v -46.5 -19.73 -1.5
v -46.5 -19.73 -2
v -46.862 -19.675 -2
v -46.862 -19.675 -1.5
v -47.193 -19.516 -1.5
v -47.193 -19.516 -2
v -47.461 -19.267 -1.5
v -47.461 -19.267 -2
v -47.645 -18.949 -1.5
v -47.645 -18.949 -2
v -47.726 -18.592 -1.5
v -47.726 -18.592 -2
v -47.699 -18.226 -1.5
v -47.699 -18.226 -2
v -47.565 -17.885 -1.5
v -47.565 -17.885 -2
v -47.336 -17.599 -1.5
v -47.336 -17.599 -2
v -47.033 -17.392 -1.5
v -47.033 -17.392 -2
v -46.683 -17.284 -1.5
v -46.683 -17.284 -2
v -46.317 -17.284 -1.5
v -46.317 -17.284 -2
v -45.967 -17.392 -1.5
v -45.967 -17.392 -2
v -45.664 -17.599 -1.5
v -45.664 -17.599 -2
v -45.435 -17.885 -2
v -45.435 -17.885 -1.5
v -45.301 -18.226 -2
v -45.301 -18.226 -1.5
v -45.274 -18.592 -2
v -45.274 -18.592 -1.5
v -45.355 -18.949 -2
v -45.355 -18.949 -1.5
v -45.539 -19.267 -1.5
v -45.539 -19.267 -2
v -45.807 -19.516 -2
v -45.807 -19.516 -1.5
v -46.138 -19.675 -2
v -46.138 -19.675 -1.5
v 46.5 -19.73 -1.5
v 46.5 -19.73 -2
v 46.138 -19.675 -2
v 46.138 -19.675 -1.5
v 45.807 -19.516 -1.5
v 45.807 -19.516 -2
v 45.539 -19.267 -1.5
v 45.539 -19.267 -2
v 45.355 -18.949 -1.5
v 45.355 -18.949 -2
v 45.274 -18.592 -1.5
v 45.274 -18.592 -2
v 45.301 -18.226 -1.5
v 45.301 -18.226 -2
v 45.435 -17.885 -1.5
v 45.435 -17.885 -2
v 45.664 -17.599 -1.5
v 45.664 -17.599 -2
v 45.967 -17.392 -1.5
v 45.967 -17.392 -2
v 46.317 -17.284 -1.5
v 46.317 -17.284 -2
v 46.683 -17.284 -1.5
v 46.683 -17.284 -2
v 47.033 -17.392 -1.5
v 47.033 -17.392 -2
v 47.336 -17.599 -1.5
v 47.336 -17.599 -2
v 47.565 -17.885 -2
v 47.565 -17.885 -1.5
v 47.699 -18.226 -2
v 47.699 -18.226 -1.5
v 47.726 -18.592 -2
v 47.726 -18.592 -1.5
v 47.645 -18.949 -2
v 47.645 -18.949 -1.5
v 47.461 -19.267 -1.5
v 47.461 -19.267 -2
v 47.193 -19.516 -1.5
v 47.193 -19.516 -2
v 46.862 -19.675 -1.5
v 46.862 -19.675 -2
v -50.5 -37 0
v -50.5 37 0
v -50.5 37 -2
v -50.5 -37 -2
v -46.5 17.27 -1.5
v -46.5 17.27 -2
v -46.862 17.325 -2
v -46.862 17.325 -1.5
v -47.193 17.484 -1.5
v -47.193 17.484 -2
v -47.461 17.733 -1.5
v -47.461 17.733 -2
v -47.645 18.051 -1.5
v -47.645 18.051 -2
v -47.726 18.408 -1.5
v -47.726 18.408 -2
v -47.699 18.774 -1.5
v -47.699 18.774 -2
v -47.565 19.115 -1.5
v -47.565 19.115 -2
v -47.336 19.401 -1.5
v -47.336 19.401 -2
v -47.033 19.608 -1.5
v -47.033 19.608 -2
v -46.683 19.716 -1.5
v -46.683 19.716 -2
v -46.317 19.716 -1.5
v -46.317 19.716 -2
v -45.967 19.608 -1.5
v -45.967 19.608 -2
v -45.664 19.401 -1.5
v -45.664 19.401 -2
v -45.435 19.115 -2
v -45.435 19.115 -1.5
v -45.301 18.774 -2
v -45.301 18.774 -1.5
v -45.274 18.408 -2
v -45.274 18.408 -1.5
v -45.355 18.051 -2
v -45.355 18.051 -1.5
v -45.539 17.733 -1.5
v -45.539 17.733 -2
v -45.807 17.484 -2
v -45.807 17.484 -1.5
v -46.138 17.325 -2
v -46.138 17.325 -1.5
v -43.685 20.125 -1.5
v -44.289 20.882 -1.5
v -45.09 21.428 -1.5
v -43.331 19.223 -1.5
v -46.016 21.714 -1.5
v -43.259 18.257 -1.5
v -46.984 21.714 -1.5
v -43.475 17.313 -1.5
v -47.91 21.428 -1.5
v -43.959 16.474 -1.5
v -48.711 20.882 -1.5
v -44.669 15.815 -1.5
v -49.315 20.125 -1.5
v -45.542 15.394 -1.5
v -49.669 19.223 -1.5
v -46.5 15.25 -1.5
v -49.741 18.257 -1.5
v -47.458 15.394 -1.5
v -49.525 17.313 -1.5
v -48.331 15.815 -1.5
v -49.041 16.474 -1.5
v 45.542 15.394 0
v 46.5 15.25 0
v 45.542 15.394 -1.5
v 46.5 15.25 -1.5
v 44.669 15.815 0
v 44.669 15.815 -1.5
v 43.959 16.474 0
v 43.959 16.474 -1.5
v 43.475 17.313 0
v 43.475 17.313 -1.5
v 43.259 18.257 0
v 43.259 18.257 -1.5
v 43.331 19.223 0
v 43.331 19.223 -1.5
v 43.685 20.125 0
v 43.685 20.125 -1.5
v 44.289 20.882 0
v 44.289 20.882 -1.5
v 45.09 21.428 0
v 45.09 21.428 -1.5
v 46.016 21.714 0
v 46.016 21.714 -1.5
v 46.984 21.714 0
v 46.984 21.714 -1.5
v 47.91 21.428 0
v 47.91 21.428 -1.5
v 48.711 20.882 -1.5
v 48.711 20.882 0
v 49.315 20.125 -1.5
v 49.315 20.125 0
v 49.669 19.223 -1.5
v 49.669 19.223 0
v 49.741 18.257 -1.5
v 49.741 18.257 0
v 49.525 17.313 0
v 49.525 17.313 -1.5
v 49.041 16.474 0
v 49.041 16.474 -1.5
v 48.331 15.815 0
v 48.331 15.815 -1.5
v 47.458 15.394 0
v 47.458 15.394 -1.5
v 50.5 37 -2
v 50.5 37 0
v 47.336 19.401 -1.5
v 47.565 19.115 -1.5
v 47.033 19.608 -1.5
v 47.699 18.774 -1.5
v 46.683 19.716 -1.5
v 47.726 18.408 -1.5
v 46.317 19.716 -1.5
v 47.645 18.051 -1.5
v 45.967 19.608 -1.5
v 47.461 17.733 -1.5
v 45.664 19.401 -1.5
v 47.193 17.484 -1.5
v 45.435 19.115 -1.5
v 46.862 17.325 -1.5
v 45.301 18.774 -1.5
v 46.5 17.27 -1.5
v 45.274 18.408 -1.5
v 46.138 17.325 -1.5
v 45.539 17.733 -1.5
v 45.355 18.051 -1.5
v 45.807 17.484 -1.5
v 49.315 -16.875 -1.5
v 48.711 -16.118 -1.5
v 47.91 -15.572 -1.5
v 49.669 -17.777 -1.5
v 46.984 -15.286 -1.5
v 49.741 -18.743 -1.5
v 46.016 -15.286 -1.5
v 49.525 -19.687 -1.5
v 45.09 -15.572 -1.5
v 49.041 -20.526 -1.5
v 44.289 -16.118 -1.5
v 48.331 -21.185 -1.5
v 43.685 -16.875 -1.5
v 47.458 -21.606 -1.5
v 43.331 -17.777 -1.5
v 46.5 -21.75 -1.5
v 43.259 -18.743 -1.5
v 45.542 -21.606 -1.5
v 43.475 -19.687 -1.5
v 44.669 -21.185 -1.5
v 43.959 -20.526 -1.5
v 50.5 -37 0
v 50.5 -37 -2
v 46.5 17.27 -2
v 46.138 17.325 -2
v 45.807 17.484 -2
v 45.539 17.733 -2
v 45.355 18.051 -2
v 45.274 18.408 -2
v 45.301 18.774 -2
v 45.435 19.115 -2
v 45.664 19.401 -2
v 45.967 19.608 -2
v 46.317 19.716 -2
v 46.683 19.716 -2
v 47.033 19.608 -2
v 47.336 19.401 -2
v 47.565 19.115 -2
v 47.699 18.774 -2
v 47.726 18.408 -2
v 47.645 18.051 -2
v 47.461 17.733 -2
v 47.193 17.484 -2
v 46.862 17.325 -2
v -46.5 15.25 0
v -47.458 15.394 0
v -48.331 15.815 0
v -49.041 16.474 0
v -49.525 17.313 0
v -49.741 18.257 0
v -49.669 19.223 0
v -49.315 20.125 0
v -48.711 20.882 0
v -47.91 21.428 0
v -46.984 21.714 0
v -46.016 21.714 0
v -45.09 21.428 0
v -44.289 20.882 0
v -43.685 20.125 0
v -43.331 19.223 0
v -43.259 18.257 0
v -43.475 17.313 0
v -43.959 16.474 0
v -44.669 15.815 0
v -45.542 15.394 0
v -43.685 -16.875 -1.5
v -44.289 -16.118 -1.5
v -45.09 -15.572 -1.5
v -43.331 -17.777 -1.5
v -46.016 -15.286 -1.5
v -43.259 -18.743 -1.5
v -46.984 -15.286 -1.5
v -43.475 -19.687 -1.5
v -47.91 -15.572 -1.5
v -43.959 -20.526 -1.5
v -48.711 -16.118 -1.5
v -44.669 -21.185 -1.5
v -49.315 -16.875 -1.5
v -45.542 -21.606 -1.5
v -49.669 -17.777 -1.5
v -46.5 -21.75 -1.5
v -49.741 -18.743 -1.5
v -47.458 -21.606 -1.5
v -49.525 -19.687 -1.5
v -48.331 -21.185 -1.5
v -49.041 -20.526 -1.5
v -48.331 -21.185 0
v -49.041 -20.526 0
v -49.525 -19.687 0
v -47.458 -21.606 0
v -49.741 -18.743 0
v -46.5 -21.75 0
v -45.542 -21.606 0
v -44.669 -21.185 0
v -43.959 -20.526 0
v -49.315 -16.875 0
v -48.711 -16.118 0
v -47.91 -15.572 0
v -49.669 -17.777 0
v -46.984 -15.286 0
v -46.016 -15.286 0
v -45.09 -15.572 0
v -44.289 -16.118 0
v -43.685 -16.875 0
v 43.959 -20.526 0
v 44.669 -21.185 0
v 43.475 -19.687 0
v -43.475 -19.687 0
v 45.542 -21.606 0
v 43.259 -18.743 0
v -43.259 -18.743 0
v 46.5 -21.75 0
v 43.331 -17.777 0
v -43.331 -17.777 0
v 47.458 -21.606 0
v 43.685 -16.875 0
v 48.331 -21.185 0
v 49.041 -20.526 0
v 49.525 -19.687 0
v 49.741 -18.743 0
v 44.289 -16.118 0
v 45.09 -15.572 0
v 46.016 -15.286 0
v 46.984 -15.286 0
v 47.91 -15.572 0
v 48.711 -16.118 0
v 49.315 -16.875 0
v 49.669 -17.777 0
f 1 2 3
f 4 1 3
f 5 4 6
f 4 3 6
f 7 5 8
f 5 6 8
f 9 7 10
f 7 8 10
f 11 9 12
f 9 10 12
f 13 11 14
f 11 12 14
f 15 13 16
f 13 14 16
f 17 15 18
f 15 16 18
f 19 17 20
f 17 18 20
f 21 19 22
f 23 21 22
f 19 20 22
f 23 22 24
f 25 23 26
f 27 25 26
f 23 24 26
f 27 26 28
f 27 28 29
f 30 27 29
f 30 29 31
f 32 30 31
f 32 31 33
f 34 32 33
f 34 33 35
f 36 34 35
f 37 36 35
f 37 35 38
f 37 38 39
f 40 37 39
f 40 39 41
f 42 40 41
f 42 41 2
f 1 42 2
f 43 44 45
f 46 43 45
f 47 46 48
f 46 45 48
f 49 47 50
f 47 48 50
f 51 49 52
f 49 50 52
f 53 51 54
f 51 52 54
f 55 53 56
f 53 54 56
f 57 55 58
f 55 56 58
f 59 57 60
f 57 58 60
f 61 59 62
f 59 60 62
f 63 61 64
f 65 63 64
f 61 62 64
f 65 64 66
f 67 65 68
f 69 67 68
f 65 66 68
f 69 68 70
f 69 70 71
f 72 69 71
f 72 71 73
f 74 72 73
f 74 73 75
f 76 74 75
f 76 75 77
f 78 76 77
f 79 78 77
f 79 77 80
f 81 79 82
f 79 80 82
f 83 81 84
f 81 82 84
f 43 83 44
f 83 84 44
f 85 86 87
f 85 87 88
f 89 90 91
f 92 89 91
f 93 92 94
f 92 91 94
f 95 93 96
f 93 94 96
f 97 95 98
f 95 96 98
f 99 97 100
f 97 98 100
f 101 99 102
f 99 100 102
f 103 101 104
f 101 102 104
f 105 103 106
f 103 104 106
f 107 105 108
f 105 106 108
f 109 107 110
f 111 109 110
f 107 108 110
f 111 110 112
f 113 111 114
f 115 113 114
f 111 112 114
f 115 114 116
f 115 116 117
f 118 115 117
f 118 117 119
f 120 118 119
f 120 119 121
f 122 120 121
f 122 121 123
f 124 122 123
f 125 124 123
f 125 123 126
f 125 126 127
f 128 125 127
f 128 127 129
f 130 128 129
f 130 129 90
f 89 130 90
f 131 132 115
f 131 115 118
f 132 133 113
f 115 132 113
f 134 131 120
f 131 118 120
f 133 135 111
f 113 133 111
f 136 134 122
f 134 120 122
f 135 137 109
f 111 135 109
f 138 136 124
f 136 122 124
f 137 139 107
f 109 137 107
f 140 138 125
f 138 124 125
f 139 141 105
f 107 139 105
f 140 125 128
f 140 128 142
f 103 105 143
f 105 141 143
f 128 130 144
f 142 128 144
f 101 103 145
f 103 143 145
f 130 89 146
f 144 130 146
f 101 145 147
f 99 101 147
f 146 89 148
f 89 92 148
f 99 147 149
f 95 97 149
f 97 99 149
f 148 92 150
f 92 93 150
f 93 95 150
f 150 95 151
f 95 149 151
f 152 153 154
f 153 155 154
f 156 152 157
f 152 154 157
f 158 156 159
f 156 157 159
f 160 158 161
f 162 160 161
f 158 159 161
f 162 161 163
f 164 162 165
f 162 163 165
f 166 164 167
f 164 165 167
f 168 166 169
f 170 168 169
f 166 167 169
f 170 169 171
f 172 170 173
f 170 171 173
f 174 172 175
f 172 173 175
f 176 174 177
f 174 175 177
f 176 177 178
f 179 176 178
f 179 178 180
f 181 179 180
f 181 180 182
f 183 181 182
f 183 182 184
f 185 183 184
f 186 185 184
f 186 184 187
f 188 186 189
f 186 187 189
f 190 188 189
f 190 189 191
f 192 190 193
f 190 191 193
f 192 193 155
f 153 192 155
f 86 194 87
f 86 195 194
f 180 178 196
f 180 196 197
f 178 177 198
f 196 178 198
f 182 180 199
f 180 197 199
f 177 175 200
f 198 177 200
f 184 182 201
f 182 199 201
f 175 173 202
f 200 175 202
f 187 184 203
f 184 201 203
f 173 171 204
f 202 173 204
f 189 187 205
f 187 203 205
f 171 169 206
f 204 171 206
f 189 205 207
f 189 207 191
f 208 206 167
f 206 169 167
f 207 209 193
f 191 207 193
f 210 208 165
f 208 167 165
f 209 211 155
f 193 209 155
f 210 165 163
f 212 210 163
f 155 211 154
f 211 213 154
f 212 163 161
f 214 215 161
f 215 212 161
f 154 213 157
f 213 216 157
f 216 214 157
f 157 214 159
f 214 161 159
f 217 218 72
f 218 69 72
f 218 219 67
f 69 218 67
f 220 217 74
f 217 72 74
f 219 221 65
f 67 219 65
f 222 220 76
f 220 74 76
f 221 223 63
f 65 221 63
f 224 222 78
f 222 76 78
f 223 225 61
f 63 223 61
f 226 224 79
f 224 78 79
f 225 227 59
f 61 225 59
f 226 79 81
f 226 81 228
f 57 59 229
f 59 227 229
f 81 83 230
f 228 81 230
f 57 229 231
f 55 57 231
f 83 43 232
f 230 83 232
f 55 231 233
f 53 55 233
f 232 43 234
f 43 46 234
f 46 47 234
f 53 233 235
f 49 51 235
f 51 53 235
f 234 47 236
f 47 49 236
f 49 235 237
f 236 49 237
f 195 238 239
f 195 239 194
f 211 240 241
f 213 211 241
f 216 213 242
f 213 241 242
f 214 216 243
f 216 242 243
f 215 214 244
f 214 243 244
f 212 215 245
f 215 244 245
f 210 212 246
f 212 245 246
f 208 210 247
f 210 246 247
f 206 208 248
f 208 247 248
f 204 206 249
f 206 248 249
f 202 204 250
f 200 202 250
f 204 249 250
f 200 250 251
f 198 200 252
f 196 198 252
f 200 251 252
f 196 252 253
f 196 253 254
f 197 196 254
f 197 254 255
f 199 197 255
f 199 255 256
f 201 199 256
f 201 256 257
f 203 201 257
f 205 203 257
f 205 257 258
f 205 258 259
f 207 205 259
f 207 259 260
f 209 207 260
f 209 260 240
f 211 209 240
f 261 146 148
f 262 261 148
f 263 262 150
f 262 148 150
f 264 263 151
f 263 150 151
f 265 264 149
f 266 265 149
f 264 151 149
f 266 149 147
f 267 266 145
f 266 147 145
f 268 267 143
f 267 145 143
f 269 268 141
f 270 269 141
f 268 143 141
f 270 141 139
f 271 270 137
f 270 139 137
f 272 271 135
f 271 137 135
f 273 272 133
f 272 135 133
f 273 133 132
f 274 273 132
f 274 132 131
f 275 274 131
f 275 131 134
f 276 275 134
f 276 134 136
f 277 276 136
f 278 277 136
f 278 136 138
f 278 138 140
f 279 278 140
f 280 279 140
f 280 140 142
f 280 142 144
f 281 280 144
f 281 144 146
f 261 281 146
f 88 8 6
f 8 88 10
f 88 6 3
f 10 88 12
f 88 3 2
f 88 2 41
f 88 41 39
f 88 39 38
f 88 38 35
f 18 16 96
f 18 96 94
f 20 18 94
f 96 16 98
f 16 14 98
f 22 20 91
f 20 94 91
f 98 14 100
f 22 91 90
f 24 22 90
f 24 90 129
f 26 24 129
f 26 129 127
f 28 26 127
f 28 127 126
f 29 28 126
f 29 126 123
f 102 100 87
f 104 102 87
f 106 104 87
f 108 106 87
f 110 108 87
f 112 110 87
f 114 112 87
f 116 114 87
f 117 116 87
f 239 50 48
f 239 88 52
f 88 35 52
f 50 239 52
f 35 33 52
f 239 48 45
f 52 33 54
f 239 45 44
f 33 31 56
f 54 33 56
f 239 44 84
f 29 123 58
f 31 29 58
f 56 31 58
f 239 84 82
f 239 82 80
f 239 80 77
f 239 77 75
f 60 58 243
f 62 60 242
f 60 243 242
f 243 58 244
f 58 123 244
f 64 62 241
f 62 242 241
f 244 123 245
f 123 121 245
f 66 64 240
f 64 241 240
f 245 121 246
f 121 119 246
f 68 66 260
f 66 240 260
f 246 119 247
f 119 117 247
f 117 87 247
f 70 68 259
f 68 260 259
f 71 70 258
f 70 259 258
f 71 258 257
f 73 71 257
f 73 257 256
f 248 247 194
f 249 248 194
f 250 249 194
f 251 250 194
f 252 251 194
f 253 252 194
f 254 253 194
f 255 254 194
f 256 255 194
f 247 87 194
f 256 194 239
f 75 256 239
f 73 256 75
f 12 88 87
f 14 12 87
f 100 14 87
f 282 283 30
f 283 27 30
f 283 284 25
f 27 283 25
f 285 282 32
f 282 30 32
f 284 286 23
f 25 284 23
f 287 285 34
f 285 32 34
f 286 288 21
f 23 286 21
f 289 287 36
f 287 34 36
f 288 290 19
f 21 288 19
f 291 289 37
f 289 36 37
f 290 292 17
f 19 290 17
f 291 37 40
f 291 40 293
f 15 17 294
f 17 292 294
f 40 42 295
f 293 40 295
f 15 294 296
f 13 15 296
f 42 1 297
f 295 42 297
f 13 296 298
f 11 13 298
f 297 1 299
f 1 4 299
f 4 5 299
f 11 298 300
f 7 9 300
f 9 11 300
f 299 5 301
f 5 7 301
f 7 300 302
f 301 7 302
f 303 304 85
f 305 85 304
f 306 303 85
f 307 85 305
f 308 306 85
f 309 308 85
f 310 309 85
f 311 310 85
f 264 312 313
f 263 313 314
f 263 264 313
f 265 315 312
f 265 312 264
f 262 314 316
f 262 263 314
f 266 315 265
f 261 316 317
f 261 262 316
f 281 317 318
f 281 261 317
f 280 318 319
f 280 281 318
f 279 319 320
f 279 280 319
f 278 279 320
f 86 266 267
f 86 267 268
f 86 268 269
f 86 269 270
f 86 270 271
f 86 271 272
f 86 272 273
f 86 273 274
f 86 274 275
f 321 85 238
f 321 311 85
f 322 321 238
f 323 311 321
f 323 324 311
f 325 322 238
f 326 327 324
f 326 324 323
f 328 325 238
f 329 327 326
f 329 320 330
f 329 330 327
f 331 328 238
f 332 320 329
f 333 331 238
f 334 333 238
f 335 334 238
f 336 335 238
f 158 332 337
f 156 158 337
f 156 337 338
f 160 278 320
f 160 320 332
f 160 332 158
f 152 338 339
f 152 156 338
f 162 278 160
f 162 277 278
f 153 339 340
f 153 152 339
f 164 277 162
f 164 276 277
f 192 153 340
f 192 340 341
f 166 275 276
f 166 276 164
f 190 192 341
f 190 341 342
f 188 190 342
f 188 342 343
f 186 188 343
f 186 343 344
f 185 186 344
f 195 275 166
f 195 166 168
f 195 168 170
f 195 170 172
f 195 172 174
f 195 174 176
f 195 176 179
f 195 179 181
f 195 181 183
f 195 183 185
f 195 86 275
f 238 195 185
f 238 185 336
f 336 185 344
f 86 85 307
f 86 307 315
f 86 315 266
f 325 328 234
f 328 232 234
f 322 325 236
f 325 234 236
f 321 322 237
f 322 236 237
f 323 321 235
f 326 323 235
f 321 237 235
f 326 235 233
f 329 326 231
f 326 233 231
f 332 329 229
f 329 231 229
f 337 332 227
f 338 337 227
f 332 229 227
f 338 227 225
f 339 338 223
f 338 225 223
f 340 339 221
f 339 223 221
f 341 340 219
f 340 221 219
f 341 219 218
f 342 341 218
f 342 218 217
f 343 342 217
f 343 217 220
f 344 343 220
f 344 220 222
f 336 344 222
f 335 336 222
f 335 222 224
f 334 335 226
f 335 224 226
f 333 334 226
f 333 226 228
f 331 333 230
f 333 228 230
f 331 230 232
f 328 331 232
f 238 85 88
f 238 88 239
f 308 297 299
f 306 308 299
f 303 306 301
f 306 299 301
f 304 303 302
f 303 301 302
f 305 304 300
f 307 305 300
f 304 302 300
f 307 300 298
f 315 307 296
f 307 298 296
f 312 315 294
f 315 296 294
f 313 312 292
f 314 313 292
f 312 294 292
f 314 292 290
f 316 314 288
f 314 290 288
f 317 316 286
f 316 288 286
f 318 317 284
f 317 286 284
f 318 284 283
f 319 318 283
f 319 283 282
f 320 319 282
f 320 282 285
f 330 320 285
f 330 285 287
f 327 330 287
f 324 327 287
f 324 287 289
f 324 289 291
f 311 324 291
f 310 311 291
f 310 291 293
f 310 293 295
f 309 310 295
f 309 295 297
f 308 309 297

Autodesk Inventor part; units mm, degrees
ref_plane "YZ Plane" through (0, 0, 0) normal (1, 0, 0) x (0, 1, 0)
ref_plane "XZ Plane" through (0, 0, 0) normal (0, 1, 0) x (-1, 0, 0)
ref_plane "XY Plane" through (0, 0, 0) normal (0, 0, 1) x (1, 0, 0)
sketch "Esboço1" plane through (0, 0, 0) normal (0, 0, 1) x (1, 0, 0)
  line L0 (-50.5, -37) -> (50.5, -37)
  line L1 (50.5, -37) -> (50.5, 37)
  line L2 (50.5, 37) -> (-50.5, 37)
  line L3 (-50.5, 37) -> (-50.5, -37)
  point P0 (0, 0)
  dimension "d2" = 101
  dimension "d3" = 74
  dimension "d4" = 101
  dimension "d5" = 50.5
  dimension "d6" = 37
extrude "Extrusão1" add sketch "Esboço1" against normal blind 2
sketch "Esboço2" plane through (0, 0, 0) normal (0, 0, 1) x (1, 0, 0)
  line L0 (-50.5, -37) -> (-50.5, 37) projected
  line L1 (-50.5, 37) -> (50.5, 37) projected
  line L2 (-46.5, 37) -> (-46.5, -37) construction
  line L3 (50.5, -37) -> (-50.5, -37) projected
  line L4 (46.5, 37) -> (46.5, -37) construction
  line L5 (-50.5, 18.5) -> (50.5, 18.5) construction
  line L6 (-50.5, -18.5) -> (50.5, -18.5) construction
  line L7 (50.5, 37) -> (50.5, -37) projected
  point P0 (0, 0)
  point P1 (-46.5, 18.5)
  point P2 (-46.5, -18.5)
  point P3 (46.5, -18.5)
  point P4 (46.5, 18.5)
  dimension "d13" = 4
  dimension "d14" = 97
  dimension "d15" = 18.5
  dimension "d16" = 55.5
  dimension "d17" = 0
hole "Furo1" at (-46.5, 18.5, 0) at (-46.5, -18.5, 0) at (46.5, -18.5, 0) at (46.5, 18.5, 0) direction (0, 0, -1) diameter 2.459 end through all counterbore diameter 6.5 counterbore depth 1.5
properties part number "Ra-Manager_Painel-Placas_Tras_Cego"
